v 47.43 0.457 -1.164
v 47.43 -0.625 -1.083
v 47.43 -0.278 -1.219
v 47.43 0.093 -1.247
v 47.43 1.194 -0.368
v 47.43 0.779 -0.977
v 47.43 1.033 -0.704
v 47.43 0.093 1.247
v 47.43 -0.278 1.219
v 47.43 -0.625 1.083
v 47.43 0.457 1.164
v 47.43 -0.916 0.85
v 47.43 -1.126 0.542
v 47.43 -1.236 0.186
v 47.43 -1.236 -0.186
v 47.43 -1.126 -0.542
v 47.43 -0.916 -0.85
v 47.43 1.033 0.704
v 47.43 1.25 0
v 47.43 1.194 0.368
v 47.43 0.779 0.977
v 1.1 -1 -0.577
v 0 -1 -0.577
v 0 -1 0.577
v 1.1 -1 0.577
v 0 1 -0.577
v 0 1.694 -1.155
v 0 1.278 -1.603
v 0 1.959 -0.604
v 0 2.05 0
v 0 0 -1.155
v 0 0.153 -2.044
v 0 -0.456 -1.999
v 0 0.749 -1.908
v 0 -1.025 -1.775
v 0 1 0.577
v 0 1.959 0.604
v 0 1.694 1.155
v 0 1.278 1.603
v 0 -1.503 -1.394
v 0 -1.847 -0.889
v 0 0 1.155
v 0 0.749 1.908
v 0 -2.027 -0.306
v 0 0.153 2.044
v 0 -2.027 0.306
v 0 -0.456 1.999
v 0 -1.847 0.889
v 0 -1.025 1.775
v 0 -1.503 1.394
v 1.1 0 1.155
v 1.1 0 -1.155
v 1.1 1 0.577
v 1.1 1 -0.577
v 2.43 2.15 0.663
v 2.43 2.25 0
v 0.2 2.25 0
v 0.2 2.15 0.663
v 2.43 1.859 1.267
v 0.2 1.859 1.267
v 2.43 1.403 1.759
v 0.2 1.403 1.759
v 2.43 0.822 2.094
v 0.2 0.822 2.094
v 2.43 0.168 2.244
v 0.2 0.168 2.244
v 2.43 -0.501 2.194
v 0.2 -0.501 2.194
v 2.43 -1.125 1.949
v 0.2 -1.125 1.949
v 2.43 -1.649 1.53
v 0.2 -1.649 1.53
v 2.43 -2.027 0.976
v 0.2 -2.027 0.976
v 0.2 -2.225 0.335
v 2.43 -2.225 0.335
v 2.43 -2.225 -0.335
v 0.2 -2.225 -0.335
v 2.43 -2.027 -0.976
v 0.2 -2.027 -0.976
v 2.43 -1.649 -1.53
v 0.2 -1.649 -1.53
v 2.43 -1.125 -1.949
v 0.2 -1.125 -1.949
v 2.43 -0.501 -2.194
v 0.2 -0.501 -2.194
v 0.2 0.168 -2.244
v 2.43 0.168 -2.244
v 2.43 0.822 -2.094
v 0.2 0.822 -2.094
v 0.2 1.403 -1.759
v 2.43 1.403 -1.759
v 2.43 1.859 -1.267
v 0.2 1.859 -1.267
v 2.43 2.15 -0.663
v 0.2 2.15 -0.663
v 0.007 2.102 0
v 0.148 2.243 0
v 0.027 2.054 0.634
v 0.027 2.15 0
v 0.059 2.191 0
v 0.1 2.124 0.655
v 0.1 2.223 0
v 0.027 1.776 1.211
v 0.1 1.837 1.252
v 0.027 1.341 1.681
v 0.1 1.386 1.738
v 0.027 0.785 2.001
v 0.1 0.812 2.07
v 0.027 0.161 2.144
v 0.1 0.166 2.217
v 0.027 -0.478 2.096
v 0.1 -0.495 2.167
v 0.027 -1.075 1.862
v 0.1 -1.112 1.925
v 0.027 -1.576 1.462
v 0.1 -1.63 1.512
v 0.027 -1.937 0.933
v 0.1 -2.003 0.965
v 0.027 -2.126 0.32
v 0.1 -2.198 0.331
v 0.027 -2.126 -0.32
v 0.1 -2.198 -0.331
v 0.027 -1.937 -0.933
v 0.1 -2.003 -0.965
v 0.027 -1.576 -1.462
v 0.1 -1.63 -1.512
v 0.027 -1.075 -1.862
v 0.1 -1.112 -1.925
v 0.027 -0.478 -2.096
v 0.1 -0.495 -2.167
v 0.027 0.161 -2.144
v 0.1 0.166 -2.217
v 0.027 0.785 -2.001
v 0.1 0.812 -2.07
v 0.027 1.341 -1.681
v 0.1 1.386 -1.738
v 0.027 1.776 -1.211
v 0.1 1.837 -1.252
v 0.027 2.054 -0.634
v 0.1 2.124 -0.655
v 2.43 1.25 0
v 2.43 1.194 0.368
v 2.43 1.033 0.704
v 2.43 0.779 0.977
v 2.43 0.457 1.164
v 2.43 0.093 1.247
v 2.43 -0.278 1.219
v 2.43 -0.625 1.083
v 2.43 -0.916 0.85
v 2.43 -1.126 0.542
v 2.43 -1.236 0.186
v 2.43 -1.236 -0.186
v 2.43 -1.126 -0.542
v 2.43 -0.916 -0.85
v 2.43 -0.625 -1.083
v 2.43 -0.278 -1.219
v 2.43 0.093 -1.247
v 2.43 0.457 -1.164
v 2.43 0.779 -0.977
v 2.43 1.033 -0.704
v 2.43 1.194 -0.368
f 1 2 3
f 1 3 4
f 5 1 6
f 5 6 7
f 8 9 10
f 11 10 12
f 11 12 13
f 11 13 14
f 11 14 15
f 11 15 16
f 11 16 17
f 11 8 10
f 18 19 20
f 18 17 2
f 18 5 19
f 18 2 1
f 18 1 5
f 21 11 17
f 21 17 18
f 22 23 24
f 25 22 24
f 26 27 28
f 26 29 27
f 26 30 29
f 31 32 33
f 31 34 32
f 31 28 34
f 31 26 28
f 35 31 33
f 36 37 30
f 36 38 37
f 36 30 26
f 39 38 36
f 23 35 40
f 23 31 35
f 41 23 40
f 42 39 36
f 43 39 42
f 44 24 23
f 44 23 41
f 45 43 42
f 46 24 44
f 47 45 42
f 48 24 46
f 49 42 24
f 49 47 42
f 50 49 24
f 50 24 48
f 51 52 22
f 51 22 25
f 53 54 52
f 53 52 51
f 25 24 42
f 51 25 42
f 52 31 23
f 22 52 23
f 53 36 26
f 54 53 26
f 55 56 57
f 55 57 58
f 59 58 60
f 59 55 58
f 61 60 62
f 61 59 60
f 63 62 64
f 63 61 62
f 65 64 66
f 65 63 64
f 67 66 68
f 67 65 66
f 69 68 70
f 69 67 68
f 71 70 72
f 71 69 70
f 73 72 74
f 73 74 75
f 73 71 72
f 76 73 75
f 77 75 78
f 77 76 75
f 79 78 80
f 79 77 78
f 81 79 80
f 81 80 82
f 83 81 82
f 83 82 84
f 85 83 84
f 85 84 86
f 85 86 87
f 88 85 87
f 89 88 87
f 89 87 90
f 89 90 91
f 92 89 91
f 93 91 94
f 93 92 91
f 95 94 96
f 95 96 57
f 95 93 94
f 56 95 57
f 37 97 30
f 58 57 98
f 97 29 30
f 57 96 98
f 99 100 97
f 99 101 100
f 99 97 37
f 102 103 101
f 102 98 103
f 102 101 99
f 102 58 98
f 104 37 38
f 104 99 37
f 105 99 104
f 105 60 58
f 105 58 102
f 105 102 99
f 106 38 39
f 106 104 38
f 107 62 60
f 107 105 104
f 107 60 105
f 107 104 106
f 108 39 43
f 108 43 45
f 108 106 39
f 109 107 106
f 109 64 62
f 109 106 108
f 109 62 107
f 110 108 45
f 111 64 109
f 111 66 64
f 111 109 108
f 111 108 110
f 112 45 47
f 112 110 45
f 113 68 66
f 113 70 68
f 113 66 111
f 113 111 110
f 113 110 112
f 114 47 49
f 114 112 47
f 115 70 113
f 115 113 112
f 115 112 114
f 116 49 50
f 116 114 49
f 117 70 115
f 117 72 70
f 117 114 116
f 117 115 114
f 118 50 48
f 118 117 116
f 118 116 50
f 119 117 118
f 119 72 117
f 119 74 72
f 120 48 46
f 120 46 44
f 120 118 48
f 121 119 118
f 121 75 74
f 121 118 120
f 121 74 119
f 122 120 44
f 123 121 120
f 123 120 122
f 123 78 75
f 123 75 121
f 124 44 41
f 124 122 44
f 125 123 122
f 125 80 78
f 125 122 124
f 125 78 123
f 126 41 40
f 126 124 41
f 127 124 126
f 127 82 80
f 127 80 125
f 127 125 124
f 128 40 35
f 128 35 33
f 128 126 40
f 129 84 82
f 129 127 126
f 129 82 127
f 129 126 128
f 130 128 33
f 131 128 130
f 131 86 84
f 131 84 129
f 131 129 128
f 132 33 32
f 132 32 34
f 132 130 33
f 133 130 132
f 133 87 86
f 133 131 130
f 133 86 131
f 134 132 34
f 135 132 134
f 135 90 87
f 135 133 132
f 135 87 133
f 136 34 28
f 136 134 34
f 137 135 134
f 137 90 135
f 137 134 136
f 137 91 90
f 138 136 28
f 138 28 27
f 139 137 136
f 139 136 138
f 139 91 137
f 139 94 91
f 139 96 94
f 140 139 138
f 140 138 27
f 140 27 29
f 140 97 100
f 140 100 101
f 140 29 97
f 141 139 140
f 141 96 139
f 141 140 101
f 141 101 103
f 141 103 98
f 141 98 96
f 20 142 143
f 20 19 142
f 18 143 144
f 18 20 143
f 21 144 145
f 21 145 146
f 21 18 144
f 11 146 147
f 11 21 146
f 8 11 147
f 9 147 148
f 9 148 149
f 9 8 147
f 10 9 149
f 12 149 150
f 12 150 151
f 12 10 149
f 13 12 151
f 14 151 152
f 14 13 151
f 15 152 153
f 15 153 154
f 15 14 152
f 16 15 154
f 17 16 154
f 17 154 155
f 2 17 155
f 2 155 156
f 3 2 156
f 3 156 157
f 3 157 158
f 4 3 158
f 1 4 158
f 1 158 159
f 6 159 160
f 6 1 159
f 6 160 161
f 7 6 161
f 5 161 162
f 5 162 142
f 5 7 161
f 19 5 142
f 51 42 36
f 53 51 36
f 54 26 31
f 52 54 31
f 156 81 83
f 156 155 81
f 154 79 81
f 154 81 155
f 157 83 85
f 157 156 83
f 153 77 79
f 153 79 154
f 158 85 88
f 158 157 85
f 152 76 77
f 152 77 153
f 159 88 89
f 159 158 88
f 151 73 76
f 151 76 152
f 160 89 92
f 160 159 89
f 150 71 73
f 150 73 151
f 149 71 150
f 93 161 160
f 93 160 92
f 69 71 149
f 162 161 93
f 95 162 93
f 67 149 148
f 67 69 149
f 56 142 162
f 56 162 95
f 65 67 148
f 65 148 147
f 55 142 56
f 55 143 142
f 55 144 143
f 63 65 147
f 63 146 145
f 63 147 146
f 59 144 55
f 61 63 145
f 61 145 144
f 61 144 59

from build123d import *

# Parameters (mm, degrees)
CUT_EXTRUDE_1_DEPTH = 1.1
FILLET_1_R          = 0.2


with BuildPart() as part:
    # 草图1 → 旋转1 (revolve)
    with BuildSketch(Plane.XY):
        Polygon((0, 0), (0, 2.25), (2.43, 2.25), (2.43, 1.25), (47.43, 1.25), (47.43, 0), align=None)
    revolve(axis=Axis((0, 0, 0), (1, 0, 0)))

    # 草图2 → 切除-拉伸1 (cut)
    with BuildSketch(Plane.ZY):
        Polygon((-1.154700538, 0), (-0.577350269, -1), (0.577350269, -1), (1.154700538, 0), (0.577350269, 1), (-0.577350269, 1), align=None)
    extrude(amount=-CUT_EXTRUDE_1_DEPTH, mode=Mode.SUBTRACT)

    # 圆角1
    fillet_1_edges = [part.edges().sort_by_distance(p)[0] for p in [
        (0, -2.25, 0),
    ]]
    fillet(fillet_1_edges, radius=FILLET_1_R)


solid = part.part
